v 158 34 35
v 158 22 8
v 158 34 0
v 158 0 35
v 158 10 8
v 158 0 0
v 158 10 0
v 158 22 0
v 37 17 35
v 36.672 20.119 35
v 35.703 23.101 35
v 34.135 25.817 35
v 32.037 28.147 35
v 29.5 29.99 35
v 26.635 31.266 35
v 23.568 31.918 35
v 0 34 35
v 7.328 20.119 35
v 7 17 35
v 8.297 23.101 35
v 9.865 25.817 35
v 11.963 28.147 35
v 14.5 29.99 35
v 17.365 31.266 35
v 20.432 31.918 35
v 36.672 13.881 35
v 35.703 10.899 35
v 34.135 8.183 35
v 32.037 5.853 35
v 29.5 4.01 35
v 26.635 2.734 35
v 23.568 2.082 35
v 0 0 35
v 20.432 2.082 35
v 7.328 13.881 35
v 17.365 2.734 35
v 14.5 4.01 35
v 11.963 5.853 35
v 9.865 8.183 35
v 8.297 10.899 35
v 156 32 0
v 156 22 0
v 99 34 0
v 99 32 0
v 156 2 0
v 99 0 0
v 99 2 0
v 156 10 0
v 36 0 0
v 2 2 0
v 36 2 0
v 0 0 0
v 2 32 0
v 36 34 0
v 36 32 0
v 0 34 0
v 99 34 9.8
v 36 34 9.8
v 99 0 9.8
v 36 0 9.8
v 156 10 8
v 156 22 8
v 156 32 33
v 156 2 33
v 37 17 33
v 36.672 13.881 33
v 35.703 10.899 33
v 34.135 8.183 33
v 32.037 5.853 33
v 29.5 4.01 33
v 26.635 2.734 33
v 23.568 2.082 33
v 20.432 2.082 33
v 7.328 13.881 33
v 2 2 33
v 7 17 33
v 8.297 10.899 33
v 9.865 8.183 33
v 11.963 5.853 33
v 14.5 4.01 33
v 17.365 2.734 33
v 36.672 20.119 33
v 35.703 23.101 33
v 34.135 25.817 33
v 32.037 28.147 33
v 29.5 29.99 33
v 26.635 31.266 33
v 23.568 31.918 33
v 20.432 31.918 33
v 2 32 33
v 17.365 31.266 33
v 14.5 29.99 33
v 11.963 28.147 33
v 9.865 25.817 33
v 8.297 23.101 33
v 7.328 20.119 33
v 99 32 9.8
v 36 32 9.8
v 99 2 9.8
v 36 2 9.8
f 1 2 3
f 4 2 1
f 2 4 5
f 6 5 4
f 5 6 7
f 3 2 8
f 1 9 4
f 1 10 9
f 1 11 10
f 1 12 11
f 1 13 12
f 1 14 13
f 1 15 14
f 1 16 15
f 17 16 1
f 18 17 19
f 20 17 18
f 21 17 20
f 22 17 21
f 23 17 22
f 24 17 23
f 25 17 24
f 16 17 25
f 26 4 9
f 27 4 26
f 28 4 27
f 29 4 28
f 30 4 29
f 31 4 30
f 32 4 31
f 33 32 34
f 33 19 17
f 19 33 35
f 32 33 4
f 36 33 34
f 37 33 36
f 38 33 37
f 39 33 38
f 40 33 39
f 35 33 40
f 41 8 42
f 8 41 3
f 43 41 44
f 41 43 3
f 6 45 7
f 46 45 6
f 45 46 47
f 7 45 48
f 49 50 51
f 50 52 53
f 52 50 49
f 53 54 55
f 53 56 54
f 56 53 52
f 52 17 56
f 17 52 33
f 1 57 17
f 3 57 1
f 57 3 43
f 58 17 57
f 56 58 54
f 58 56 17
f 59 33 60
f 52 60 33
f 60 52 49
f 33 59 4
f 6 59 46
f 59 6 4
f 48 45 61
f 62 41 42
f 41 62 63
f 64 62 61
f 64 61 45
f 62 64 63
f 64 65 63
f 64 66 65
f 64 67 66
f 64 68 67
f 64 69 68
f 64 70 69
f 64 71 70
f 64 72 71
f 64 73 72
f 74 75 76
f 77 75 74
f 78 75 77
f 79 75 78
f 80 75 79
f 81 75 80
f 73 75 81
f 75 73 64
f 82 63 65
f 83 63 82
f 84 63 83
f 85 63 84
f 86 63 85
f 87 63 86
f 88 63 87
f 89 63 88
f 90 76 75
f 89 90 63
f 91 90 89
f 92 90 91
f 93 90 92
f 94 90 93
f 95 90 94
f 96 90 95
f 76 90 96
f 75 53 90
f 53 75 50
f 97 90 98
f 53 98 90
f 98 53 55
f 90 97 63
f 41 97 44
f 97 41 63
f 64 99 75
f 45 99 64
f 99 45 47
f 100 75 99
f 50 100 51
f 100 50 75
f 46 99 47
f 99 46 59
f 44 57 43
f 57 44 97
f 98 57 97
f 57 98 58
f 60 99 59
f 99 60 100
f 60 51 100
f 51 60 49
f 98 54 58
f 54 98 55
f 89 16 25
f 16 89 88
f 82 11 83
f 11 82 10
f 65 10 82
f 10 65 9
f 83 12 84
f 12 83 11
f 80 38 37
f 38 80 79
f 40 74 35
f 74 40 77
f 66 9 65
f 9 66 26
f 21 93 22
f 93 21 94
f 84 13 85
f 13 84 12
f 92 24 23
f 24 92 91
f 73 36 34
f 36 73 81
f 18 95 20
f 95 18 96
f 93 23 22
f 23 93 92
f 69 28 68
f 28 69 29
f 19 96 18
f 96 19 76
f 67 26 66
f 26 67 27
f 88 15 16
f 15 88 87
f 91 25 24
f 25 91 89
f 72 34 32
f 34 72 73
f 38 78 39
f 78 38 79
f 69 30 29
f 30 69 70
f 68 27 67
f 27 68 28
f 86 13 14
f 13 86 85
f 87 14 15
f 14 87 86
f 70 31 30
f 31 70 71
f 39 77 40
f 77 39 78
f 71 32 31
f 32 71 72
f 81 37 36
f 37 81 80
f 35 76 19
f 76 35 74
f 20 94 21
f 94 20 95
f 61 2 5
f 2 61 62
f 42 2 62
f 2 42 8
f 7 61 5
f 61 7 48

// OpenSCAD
len_button_box = 34;
len_jacks = 63;
len_control = 57;

width = 30;
width_usb = 12;
button_radius = 15;
button_offset = 5;

offset_usb = 10;

height = 33;
height_jacks = 9.8;
height_usb = 8;


wall=2;

difference() {
    cube([len_button_box + len_jacks + len_control + 2*wall, width + 2*wall, height + wall]);
    translate([wall, wall,-wall]) {
        cube([len_button_box + len_jacks + len_control, width, height + wall]);
    }
    translate([wall + len_button_box, -wall, -wall]) {
        cube([len_jacks, width + 4*wall, height_jacks + wall]);
    }
    translate([wall + button_offset + button_radius, wall+width/2, 0]) {
        cylinder(h=height + 2*wall, r = button_radius);
    }
    translate([wall+len_button_box + len_jacks + len_control, offset_usb, -wall]) {
        cube([3*wall, width_usb, height_usb + wall]);
    }
}
